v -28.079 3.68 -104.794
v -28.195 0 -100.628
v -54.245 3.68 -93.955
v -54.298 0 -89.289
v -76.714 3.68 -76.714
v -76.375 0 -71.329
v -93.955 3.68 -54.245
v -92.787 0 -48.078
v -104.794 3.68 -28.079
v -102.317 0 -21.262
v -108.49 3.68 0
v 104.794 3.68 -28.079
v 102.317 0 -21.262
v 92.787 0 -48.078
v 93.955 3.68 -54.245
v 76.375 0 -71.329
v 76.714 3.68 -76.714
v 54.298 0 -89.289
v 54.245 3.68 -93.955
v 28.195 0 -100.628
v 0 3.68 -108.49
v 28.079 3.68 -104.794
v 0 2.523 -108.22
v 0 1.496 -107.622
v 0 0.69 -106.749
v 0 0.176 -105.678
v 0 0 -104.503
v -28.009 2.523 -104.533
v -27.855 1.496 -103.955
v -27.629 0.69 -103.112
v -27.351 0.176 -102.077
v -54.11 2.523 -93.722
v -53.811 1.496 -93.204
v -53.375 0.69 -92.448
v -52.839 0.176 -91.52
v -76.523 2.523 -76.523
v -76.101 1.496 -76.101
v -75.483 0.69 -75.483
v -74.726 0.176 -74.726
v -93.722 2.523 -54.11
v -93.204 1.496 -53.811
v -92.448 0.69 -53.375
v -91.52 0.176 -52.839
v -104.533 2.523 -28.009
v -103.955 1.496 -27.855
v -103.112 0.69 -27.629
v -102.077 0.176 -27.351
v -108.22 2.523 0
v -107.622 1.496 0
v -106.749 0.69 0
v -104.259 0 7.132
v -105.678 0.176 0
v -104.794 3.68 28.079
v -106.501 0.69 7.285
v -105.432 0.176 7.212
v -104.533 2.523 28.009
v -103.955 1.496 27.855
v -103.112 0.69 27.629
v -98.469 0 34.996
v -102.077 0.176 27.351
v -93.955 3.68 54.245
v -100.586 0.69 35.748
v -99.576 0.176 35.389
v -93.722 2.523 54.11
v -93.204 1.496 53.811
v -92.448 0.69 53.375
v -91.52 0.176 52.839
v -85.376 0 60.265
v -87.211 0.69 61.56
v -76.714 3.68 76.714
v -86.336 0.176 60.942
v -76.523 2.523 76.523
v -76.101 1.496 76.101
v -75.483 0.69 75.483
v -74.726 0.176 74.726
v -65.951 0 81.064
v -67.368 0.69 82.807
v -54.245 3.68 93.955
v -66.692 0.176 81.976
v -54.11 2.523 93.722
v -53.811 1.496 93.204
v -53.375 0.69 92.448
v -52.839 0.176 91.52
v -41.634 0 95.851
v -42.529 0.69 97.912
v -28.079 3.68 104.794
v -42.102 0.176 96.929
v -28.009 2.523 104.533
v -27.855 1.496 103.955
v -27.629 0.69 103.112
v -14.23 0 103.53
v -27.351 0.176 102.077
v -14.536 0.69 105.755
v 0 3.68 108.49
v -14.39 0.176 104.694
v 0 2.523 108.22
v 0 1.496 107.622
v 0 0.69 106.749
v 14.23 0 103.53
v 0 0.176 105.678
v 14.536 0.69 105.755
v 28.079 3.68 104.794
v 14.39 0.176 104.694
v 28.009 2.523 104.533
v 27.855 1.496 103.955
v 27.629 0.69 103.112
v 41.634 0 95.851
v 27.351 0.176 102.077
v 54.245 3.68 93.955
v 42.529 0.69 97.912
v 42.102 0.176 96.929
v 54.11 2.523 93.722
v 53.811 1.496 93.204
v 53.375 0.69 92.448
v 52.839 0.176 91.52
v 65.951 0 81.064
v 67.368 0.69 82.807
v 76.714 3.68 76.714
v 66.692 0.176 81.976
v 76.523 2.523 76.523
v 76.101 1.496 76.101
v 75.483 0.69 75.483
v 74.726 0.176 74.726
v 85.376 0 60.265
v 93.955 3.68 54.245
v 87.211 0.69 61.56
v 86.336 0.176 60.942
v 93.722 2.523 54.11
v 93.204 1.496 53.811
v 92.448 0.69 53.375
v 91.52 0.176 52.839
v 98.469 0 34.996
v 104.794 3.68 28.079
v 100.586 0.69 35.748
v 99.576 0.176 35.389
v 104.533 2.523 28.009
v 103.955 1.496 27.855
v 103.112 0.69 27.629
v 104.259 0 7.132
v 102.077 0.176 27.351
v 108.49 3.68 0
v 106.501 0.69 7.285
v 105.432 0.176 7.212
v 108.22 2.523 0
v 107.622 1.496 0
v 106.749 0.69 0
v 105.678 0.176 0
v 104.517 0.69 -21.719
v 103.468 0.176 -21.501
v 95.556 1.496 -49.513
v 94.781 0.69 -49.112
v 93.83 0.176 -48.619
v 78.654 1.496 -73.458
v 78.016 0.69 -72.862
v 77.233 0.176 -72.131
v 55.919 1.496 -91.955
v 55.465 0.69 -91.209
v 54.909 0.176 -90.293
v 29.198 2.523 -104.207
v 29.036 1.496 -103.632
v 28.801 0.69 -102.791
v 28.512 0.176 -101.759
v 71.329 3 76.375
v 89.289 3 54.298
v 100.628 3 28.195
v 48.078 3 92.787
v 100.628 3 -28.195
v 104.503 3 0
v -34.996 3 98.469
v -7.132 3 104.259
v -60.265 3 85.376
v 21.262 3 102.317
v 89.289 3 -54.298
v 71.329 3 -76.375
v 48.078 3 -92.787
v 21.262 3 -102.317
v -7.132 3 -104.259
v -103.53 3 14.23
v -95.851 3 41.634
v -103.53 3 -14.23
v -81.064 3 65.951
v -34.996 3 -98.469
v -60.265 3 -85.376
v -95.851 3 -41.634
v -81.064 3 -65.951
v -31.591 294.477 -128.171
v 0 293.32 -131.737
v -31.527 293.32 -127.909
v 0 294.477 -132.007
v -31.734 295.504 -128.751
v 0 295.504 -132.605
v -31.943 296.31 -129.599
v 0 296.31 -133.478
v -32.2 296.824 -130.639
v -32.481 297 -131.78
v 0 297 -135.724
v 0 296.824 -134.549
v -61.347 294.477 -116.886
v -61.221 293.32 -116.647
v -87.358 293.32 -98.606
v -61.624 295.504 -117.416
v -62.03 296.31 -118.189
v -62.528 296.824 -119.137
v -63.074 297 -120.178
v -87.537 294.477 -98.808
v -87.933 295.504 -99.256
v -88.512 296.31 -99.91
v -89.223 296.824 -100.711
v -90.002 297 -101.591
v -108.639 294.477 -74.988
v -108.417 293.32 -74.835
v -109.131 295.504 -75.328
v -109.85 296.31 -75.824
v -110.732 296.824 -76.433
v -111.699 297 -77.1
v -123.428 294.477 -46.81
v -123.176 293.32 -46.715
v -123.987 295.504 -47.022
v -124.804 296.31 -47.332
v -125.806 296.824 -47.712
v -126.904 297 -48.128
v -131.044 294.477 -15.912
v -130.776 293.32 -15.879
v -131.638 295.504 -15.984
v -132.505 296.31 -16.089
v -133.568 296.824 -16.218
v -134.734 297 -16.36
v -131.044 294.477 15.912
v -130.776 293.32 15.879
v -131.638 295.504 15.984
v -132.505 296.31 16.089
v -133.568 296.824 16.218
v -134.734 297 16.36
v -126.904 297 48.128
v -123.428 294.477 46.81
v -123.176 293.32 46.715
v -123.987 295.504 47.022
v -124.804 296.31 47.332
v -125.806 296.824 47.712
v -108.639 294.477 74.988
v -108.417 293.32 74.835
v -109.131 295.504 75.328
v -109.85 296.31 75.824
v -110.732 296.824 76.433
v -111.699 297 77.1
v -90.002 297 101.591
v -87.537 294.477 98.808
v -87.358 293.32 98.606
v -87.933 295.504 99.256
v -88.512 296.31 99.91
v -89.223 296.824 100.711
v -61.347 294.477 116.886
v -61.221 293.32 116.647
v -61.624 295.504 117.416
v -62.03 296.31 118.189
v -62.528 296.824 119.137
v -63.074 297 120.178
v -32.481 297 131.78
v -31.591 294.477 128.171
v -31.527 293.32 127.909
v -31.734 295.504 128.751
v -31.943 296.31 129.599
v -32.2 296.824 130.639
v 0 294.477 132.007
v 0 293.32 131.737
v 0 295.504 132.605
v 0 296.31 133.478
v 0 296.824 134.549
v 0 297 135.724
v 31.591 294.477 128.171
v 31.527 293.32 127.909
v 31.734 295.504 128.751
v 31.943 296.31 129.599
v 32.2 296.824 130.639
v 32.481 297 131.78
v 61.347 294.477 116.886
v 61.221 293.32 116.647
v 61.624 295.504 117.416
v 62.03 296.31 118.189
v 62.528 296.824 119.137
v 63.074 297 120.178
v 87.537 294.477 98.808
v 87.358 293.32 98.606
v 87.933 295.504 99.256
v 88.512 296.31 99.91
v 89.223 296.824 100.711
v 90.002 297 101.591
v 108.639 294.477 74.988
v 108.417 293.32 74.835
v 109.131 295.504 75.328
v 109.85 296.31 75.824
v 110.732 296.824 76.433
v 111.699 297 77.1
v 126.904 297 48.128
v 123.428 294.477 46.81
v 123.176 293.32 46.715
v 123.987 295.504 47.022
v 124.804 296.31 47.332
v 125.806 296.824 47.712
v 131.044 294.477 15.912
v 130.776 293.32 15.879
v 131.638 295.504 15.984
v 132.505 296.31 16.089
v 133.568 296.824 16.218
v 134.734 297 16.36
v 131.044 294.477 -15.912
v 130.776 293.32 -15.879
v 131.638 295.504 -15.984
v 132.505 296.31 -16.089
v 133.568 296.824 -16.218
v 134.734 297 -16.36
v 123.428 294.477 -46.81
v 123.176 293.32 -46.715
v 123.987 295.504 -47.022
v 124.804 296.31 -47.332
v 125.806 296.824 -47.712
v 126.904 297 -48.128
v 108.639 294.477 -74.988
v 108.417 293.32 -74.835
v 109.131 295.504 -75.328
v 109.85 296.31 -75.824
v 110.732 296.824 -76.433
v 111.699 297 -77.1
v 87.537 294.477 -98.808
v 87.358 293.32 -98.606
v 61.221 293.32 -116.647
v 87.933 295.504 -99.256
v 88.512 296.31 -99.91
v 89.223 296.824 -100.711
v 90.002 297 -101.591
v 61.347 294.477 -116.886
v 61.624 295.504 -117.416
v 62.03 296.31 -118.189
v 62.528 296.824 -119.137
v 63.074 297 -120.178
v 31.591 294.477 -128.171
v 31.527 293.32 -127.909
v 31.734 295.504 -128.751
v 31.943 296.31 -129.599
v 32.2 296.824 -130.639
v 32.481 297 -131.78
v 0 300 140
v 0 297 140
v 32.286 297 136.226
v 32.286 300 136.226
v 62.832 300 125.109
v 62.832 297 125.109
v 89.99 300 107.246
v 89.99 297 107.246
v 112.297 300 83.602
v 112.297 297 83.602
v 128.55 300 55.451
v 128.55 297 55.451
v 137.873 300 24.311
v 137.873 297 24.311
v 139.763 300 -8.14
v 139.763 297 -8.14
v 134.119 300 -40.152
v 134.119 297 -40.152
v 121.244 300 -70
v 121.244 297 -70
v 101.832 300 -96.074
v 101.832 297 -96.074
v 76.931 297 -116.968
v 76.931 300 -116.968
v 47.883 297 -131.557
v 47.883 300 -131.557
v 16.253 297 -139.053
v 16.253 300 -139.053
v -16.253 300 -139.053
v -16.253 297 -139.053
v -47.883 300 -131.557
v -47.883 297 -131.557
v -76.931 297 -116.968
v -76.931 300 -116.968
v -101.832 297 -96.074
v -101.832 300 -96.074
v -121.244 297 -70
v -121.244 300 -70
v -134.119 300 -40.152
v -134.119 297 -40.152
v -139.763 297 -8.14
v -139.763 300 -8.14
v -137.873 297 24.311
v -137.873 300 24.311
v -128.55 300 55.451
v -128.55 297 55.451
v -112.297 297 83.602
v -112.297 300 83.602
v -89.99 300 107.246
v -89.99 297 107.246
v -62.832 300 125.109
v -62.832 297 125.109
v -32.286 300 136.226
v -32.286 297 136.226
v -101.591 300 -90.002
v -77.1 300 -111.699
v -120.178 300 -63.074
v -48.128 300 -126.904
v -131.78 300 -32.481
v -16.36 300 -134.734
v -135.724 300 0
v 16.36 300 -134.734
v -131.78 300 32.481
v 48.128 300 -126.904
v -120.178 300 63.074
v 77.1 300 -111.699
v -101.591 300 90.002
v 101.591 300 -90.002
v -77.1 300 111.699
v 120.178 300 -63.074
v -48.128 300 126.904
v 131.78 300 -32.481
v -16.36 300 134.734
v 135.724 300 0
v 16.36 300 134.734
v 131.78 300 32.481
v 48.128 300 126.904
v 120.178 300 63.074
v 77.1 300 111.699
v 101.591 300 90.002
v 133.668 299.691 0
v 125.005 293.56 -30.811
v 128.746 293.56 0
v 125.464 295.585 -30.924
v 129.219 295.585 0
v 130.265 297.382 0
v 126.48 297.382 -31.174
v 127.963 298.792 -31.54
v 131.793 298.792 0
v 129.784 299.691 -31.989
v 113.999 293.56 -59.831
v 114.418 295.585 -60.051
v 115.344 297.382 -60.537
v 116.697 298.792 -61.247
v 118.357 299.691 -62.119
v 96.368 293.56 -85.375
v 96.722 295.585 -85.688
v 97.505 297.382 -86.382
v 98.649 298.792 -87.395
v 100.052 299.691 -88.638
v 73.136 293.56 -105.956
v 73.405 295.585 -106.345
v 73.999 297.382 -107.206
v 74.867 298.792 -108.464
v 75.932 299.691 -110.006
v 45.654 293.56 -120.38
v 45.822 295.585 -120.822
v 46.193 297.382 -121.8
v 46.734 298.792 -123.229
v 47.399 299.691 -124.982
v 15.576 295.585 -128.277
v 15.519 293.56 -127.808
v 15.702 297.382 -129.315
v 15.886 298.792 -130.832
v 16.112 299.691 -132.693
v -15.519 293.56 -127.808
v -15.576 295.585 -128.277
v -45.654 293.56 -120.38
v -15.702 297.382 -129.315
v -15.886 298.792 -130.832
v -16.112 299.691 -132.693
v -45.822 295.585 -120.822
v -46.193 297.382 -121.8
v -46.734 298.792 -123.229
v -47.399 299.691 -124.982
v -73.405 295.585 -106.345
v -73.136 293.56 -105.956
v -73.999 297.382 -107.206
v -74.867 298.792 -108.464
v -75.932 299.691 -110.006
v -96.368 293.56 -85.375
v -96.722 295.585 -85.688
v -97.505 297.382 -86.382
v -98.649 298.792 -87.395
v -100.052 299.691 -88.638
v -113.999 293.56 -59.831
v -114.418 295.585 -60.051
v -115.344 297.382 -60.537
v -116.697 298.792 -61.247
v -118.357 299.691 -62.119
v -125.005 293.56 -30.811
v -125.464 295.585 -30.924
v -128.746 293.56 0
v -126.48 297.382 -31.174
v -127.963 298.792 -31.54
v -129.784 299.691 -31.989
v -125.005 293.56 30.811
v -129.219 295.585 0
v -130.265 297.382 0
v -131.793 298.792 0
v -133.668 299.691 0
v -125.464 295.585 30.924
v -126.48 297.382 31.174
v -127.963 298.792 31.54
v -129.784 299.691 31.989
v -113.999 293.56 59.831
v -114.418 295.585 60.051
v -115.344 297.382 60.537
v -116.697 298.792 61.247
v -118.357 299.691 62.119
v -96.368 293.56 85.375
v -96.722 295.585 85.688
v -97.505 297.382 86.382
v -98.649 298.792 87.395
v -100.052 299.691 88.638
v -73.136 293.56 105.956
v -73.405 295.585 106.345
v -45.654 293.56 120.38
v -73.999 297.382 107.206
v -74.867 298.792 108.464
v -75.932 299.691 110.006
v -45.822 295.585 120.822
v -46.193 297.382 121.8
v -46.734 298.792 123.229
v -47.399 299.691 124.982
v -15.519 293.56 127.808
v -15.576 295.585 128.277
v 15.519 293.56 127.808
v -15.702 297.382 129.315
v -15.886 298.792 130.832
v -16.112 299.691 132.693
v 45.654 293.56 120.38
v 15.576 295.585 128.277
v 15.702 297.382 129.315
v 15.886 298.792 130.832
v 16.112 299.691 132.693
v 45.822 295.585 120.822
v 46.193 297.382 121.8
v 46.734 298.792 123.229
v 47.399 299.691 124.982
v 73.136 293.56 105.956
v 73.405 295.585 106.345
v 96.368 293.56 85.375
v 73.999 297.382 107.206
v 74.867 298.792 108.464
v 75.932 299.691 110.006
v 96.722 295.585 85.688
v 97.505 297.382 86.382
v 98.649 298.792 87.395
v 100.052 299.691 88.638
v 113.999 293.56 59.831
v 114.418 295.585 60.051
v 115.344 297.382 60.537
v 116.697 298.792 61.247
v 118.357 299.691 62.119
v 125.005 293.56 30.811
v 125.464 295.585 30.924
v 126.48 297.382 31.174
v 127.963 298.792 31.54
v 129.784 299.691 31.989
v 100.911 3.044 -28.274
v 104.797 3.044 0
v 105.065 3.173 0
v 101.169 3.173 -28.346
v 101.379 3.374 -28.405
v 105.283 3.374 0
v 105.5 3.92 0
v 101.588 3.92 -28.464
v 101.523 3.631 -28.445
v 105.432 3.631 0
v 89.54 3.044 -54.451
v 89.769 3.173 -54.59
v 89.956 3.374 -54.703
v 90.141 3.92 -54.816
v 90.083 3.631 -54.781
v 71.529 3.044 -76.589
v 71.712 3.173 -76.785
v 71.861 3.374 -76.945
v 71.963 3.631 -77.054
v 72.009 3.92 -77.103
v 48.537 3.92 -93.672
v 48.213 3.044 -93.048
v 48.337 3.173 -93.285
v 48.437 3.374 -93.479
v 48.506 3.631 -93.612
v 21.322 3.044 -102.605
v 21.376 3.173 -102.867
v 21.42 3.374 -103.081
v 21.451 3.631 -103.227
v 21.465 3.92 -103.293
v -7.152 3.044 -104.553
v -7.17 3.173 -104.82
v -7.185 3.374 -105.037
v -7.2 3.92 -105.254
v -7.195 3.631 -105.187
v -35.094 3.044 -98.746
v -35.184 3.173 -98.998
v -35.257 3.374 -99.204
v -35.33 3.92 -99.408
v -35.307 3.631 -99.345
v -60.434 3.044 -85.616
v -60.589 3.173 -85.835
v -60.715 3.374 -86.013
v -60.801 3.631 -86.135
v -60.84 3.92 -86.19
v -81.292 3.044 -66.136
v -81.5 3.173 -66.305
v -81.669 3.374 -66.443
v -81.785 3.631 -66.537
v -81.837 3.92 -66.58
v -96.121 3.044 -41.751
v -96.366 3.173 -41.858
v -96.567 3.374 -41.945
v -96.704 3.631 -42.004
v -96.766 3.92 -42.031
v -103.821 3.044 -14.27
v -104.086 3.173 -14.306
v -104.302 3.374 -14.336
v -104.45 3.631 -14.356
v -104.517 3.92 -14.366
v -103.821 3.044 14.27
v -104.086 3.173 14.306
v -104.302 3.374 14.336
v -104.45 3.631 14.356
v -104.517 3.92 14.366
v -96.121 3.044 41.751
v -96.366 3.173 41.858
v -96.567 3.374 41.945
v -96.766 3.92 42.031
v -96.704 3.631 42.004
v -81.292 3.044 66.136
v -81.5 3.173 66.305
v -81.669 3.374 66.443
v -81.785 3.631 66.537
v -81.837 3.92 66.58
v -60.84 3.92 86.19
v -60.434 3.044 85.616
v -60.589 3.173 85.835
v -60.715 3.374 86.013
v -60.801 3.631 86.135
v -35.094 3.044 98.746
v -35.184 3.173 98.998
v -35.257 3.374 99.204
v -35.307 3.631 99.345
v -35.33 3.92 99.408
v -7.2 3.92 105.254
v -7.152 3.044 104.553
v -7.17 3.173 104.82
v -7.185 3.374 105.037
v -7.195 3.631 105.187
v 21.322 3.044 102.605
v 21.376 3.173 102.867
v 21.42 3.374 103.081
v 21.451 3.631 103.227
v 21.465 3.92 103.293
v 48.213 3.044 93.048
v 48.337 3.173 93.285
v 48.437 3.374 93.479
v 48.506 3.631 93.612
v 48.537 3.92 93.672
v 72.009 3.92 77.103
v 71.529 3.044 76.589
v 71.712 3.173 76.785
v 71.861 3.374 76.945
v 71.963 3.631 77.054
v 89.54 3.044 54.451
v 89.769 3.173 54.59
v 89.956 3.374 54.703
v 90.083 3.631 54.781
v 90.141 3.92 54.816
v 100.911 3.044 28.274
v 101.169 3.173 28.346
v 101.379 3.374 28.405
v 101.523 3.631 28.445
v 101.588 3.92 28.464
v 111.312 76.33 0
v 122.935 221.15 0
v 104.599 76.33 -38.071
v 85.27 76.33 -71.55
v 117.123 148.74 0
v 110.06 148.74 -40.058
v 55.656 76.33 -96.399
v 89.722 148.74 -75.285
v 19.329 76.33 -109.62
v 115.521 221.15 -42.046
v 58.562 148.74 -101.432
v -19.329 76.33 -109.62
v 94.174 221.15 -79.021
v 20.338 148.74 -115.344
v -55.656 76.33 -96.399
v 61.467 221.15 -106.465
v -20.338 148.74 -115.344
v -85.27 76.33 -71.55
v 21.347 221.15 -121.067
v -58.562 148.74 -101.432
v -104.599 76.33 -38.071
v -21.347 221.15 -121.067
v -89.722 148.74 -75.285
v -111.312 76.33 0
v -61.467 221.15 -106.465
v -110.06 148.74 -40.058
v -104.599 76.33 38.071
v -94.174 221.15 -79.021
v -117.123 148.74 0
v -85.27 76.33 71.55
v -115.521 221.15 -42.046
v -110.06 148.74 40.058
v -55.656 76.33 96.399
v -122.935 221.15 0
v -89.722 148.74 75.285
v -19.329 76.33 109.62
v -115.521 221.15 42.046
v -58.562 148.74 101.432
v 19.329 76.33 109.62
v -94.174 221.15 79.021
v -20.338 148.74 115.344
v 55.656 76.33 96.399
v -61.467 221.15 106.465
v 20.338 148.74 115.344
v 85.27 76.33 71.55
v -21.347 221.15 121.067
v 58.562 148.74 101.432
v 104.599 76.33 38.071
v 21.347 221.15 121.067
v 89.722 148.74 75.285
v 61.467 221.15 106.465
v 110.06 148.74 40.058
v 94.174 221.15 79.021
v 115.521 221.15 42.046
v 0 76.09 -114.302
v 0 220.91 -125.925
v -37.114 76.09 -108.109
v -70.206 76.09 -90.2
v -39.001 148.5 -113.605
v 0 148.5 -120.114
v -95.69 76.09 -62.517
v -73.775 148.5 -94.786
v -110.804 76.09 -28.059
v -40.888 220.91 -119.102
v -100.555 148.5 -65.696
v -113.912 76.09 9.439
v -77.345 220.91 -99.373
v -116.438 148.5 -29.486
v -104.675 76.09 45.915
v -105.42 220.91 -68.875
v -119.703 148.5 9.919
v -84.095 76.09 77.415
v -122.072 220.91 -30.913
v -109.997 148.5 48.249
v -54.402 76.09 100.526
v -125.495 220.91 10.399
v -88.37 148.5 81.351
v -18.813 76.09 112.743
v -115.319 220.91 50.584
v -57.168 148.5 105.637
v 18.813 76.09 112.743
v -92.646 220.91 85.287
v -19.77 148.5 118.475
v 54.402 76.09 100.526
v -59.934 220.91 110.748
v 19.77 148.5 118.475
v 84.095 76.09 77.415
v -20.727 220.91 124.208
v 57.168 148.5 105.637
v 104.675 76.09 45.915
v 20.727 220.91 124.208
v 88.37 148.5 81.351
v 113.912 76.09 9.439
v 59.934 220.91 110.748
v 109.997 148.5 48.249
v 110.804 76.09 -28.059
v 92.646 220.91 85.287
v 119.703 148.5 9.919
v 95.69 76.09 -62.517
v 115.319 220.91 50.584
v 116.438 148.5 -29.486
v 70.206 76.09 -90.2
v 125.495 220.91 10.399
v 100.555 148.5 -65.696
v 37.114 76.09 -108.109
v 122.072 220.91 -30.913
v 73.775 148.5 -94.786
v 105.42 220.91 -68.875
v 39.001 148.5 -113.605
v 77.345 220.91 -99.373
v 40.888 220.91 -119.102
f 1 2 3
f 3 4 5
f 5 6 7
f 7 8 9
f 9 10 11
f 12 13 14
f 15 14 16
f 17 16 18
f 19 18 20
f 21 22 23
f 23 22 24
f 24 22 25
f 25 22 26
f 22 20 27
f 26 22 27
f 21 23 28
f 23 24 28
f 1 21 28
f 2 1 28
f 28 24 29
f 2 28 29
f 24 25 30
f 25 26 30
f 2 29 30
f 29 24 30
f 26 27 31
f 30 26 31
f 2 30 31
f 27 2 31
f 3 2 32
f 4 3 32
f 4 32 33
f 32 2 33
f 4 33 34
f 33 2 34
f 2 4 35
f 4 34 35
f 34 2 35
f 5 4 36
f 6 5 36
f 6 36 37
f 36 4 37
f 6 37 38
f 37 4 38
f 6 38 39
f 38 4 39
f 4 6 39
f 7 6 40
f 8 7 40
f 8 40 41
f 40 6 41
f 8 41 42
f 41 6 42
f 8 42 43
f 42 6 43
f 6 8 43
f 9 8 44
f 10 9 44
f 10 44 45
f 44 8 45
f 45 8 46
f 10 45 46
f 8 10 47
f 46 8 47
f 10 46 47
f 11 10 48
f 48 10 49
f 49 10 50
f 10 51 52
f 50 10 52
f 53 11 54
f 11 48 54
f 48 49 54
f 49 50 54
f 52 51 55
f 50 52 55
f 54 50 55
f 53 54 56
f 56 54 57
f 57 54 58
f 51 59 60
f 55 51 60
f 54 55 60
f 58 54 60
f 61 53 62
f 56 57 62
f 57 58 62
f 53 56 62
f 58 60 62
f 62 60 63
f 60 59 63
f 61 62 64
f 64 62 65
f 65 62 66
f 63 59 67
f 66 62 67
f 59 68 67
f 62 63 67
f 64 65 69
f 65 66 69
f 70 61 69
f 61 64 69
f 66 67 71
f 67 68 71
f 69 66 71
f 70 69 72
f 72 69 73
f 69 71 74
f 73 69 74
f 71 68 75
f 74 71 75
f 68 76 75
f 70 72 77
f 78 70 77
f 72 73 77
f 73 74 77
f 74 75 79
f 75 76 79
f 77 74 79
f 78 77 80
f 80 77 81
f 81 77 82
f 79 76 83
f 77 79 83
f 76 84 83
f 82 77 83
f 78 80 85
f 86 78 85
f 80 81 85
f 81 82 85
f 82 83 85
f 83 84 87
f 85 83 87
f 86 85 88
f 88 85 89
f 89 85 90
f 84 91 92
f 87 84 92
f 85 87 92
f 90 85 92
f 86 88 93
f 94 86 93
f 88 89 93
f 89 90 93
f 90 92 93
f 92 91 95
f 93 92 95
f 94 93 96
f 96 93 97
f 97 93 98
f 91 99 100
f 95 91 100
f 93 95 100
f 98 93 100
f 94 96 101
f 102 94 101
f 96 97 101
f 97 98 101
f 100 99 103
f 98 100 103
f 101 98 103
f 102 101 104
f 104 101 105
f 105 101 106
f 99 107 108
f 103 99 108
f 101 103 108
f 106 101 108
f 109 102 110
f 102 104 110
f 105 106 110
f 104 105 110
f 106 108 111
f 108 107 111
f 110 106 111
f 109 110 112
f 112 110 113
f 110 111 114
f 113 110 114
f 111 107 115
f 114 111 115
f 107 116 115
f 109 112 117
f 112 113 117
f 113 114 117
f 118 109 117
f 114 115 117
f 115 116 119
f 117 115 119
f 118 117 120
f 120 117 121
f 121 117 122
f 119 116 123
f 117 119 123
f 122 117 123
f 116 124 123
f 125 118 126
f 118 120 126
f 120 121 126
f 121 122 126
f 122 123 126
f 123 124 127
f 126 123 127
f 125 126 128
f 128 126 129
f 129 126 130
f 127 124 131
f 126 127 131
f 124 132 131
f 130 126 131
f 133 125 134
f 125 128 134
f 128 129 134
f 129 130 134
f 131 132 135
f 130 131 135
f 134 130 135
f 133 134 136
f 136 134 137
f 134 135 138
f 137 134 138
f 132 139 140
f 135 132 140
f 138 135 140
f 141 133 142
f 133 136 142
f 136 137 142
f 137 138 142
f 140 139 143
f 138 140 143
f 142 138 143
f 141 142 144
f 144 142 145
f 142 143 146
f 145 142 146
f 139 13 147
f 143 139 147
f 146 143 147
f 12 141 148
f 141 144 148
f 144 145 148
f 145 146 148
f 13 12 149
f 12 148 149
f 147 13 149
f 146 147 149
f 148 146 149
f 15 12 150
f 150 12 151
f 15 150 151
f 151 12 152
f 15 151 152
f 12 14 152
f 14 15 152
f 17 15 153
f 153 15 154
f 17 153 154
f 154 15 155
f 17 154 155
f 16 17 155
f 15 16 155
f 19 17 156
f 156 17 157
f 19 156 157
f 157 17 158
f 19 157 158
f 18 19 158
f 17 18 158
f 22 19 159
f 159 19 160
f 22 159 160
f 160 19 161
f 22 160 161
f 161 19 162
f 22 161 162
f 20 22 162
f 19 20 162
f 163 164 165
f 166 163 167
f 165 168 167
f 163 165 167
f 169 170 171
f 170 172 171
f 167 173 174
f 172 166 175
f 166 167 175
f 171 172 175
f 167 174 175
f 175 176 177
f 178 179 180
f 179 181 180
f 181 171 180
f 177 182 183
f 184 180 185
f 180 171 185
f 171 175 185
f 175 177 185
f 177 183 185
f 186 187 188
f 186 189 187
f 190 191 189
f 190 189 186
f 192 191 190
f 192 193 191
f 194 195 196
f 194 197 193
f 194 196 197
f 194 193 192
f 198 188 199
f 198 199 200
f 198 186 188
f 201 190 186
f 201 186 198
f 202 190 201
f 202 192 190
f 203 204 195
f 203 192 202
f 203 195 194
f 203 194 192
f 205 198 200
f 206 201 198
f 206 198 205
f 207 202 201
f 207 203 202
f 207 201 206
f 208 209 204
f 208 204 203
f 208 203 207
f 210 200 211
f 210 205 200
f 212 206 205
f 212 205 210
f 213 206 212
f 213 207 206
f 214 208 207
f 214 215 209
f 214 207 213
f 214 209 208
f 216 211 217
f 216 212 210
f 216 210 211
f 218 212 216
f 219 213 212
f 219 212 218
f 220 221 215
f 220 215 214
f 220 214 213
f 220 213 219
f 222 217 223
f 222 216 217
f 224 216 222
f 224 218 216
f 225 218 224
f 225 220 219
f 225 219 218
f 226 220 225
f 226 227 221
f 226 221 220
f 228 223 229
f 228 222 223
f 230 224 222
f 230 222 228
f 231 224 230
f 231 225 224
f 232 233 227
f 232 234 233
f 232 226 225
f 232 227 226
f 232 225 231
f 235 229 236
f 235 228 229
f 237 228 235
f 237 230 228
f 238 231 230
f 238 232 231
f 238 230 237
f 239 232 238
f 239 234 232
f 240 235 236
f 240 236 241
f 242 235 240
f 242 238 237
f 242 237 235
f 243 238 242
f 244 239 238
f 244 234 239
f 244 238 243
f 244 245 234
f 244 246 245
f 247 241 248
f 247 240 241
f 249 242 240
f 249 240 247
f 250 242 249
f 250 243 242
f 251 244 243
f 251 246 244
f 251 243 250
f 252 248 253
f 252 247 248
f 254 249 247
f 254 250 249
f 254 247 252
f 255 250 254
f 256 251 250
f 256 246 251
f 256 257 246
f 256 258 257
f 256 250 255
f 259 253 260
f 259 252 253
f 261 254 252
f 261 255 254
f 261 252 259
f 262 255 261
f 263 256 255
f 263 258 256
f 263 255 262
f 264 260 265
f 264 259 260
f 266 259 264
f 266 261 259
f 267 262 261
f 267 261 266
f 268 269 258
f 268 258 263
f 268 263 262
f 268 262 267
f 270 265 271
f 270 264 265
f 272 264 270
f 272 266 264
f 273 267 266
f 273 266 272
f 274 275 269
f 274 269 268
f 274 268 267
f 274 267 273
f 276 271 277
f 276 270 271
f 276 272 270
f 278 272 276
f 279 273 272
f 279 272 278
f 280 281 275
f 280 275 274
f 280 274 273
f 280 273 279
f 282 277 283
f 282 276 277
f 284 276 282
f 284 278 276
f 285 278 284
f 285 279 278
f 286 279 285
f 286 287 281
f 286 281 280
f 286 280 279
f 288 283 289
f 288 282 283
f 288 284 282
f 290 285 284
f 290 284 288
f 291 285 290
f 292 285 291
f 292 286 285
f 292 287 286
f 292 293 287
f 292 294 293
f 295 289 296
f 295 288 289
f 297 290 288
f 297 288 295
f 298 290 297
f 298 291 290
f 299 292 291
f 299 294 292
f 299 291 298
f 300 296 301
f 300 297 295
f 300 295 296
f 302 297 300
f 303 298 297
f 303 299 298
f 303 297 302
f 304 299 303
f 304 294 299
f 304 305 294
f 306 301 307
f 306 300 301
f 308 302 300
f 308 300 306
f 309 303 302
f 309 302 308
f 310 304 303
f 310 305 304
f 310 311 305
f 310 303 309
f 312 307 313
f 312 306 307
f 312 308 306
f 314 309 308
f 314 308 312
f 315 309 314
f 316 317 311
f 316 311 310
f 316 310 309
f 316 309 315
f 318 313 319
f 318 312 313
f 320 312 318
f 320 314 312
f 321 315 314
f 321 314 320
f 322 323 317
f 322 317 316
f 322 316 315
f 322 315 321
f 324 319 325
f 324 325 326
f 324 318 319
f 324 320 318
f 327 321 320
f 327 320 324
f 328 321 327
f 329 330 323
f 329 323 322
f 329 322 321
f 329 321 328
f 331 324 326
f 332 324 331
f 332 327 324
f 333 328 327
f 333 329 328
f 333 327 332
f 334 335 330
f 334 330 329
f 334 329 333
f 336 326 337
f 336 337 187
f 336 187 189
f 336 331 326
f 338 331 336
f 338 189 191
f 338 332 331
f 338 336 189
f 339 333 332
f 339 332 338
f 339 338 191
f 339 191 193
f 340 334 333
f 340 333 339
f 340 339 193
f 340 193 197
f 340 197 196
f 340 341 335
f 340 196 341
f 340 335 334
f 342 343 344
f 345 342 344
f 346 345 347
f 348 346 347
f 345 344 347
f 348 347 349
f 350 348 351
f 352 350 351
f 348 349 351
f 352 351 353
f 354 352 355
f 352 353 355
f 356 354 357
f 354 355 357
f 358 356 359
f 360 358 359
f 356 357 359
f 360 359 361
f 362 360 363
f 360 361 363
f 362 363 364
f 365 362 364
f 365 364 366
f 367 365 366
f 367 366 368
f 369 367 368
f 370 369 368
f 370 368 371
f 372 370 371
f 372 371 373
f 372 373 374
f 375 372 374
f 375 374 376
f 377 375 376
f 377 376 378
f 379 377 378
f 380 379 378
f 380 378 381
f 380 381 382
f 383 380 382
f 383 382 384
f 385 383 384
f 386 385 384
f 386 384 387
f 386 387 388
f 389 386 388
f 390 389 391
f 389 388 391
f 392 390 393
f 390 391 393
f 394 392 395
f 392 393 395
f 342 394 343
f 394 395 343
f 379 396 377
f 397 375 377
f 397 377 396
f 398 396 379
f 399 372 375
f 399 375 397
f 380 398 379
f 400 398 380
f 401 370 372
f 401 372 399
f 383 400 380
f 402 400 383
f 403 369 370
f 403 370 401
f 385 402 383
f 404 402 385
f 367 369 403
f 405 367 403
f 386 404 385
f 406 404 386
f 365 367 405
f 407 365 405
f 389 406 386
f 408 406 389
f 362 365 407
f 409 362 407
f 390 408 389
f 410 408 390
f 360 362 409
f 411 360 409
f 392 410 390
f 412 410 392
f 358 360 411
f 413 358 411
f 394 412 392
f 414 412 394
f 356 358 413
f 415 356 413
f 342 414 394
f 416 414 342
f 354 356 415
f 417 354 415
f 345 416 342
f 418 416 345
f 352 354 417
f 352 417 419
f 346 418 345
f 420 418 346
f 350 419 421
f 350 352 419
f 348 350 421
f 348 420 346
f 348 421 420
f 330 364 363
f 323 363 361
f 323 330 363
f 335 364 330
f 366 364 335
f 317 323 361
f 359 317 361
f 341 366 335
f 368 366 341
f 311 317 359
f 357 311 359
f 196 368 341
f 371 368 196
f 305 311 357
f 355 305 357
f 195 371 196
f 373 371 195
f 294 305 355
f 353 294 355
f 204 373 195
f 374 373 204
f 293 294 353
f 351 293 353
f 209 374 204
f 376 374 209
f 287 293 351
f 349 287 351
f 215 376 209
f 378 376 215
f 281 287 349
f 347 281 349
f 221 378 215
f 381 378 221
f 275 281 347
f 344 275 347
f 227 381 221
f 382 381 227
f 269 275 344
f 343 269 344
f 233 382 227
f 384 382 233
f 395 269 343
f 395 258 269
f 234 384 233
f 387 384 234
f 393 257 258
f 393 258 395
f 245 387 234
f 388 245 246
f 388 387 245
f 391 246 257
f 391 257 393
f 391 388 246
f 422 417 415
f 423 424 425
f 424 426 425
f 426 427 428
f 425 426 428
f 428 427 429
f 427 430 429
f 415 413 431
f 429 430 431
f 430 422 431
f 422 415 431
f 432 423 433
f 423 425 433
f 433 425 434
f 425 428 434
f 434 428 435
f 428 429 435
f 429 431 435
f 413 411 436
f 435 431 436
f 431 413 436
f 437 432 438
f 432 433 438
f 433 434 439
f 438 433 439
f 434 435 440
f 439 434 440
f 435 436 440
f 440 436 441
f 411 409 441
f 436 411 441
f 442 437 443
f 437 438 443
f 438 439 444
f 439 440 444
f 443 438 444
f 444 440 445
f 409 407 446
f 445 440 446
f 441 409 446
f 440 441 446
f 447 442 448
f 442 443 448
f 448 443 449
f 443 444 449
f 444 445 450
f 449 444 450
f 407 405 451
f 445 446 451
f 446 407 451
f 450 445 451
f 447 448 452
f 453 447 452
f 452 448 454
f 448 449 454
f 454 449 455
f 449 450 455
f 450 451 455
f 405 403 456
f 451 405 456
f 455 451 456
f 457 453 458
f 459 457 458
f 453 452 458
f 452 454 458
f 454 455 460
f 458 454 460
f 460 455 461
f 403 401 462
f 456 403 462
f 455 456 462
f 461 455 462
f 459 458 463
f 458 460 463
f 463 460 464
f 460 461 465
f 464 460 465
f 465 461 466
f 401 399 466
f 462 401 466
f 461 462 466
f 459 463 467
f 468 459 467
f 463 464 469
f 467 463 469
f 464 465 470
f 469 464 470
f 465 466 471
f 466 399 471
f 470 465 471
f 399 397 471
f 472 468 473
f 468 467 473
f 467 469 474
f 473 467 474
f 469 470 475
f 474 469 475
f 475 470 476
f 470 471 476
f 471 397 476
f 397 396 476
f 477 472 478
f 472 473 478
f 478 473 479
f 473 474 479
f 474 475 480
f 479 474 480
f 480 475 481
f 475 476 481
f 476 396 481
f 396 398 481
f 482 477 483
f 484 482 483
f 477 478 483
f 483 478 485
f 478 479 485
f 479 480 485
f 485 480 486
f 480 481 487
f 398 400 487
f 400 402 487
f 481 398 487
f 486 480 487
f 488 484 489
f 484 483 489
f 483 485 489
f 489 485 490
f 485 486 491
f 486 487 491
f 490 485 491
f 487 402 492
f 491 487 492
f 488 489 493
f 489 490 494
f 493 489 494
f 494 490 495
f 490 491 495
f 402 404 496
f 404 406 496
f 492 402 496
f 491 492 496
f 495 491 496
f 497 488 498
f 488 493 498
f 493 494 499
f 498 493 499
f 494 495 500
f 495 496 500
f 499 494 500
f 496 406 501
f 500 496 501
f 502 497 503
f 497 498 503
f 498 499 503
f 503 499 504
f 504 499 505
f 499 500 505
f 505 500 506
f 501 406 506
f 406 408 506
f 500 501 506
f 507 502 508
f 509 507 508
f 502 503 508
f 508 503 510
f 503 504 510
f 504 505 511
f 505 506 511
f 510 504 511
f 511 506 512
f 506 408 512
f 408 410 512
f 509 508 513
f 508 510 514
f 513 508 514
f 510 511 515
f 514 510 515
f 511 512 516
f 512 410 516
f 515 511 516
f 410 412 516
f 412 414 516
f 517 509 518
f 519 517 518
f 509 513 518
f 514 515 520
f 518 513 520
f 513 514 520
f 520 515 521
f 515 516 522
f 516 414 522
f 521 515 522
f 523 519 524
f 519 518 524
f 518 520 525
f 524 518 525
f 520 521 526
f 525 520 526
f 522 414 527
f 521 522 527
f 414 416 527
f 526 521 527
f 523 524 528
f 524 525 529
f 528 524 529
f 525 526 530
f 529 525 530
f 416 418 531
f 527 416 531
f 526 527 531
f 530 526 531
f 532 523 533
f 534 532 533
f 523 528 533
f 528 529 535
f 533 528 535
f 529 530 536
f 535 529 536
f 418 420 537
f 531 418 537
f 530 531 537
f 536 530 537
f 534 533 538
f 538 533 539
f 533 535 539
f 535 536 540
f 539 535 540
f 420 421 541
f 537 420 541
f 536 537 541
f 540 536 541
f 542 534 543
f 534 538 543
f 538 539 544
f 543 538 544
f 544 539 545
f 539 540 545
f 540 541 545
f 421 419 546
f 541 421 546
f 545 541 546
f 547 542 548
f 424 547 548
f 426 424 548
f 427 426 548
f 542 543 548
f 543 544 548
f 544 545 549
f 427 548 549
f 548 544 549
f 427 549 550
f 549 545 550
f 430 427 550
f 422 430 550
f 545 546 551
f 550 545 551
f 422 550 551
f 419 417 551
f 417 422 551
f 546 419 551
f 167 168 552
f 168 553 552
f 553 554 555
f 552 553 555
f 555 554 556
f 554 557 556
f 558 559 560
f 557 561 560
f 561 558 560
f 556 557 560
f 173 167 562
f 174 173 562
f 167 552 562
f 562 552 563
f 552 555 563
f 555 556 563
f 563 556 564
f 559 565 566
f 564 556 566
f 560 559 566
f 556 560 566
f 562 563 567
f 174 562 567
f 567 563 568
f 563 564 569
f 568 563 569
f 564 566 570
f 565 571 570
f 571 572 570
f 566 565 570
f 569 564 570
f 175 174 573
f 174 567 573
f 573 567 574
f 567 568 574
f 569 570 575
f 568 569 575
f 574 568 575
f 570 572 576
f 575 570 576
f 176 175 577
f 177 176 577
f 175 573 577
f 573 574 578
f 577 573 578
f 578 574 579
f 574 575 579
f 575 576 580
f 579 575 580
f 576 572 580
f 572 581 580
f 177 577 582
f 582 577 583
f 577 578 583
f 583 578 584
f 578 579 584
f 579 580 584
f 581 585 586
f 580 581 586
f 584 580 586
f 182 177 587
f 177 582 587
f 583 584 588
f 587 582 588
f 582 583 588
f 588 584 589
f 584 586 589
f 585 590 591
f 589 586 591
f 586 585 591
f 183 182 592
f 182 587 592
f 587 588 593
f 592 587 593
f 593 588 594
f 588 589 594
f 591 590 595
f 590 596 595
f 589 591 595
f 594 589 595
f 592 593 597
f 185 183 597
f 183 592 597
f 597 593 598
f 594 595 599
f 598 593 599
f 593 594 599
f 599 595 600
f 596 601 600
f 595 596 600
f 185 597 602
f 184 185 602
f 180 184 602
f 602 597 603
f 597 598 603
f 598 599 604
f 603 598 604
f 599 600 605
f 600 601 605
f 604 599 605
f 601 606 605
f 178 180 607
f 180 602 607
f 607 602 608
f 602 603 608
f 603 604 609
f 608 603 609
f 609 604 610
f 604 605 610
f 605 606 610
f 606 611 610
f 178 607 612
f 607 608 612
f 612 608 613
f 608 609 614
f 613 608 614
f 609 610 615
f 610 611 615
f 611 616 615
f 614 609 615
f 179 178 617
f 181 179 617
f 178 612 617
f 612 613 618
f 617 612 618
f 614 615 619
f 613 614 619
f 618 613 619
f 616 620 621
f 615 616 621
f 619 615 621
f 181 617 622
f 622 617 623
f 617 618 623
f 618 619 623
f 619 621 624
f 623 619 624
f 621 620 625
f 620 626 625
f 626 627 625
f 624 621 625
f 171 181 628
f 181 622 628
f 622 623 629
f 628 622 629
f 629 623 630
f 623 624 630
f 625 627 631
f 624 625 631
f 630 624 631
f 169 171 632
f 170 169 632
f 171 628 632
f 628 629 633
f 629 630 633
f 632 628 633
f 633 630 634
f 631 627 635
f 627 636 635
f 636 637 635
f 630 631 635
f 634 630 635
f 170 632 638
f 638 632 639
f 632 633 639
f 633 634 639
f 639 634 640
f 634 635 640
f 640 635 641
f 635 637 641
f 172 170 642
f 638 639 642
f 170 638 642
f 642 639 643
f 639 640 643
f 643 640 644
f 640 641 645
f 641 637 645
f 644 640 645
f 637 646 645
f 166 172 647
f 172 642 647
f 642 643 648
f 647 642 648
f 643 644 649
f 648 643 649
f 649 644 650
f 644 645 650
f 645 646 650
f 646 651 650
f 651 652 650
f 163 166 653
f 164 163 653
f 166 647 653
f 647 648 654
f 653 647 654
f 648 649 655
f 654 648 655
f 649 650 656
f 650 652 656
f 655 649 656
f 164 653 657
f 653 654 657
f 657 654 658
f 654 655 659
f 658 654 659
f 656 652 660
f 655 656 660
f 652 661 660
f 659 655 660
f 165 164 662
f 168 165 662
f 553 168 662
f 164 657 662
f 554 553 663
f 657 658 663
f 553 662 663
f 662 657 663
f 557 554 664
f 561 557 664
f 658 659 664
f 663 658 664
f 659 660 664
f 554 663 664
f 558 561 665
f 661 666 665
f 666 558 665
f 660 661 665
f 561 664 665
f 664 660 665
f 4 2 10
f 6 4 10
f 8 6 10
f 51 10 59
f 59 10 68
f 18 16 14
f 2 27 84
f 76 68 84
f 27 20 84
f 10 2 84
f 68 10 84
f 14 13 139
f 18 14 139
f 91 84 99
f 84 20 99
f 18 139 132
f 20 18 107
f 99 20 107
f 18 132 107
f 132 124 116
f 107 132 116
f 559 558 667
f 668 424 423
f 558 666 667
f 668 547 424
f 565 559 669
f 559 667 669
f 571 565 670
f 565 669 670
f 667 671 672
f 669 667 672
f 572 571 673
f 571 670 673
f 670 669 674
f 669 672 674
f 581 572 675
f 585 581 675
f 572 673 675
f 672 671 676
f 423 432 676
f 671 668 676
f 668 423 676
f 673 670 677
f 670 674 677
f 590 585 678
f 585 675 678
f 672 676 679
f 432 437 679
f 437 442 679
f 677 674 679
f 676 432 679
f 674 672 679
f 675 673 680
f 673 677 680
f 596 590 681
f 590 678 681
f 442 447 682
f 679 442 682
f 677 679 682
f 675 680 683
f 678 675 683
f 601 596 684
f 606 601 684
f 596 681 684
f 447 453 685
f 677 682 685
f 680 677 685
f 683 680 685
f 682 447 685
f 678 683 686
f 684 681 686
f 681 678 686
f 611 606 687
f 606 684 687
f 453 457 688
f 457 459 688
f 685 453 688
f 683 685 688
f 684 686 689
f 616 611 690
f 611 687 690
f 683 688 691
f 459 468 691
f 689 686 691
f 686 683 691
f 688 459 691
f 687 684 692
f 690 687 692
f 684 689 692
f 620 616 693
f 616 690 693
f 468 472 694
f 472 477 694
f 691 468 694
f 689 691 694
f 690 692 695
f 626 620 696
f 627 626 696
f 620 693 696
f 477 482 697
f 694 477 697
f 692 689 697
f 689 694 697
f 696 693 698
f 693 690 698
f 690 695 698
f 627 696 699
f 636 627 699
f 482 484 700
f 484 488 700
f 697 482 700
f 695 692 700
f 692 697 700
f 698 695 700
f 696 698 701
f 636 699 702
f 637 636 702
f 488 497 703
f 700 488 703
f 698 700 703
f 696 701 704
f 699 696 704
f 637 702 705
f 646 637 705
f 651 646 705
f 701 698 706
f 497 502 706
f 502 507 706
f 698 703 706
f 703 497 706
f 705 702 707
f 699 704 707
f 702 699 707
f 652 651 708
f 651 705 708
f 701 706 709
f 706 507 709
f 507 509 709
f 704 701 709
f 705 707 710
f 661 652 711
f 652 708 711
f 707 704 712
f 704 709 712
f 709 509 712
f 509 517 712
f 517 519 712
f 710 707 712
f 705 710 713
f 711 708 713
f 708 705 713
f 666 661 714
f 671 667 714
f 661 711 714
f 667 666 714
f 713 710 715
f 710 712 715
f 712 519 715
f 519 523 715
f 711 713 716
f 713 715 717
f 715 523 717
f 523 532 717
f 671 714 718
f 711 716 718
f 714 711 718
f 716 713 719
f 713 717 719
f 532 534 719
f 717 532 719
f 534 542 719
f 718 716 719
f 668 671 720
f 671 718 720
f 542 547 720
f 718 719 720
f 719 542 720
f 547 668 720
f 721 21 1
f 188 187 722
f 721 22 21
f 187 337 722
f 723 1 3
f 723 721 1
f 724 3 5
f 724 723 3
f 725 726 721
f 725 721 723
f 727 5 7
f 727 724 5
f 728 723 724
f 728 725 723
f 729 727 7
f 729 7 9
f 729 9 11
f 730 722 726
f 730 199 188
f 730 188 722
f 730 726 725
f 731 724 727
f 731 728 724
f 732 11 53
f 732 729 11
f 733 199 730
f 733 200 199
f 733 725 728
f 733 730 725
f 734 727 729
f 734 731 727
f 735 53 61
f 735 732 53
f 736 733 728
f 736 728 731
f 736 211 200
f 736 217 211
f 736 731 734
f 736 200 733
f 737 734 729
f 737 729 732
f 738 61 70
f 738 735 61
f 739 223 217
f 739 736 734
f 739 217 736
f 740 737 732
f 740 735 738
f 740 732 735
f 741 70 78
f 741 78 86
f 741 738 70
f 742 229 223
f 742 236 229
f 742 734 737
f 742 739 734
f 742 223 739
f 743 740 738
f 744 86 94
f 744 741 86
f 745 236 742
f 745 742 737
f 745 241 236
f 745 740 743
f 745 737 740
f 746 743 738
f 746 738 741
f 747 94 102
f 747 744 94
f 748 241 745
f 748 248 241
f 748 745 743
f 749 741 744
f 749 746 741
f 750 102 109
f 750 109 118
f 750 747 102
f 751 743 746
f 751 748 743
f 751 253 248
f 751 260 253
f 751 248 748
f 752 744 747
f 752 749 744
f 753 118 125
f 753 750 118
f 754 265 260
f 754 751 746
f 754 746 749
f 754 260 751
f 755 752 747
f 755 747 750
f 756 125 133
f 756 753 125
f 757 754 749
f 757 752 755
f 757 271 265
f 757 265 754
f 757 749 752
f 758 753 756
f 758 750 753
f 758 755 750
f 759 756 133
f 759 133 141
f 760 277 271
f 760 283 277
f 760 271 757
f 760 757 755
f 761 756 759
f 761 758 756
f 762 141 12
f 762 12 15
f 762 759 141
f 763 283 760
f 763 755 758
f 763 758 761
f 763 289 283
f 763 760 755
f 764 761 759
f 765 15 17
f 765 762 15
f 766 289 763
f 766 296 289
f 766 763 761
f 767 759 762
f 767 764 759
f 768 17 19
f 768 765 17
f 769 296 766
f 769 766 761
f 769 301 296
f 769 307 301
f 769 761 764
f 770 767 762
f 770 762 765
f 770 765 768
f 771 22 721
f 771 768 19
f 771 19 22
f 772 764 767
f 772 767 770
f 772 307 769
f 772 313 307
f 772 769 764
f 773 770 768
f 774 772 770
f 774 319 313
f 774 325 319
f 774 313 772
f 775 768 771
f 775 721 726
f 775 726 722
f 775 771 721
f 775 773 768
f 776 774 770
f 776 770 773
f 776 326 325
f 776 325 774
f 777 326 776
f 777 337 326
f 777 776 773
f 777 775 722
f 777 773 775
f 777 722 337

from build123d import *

# Parameters (mm, degrees)
SKETCH1_R           = 140
BOSS_EXTRUDE1_DEPTH = 300
FILLET1_R           = 4


# Read off the part's stored shape, not the designer's step: Shell1
with BuildPart() as part:
    # Sketch1 → Boss-Extrude1 (new body)
    with BuildSketch(Plane(origin=(0, 0, 0), x_dir=(1, 0, 0), z_dir=(0, 1, 0))):
        with Locations(Location((0, 0, 0), (0, 0, 270))):
            Circle(SKETCH1_R)
    extrude(amount=BOSS_EXTRUDE1_DEPTH)

    # Sketch3 → Cut-Revolve1 (revolve, cut)
    with BuildSketch(Plane.XY, mode=Mode.PRIVATE) as cut_revolve1_sk:
        with BuildLine():
            Line((-107.848101266, -4.321058688), (-131.736864002, 293.320012156))
            ThreePointArc((-131.736864002, 293.320012156), (-133.011114968, 295.939391827), (-135.72404248, 297))
            Line((-135.72404248, 297), (-179.746835443, 297))
            Line((-179.746835443, 297), (-193.472957422, -4.321058688))
            Line((-193.472957422, -4.321058688), (-107.848101266, -4.321058688))
        make_face()
    revolve(cut_revolve1_sk.sketch.rotate(Axis((0, -4.321058688, 0), (0, 1, 0)), 270), axis=Axis((0, -4.321058688, 0), (0, 1, 0)), mode=Mode.SUBTRACT)

    # Fillet1
    fillet1_edges = [part.edges().sort_by_distance(p)[0] for p in [
        (0, 0, 108.194910748),
    ]]
    fillet(fillet1_edges, radius=FILLET1_R)

    # Shell1 outline → Shell1 (revolve, cut)
    with BuildSketch(Plane.XY):
        with BuildLine():
            ThreePointArc((104.503089212, 3), (105.18132109, 3.265152043), (105.499883831, 3.919996961))
            Line((105.499883831, 3.919996961), (128.746480143, 293.560021272))
            ThreePointArc((128.746480143, 293.560021272), (130.976419333, 298.143935697), (135.72404248, 300))
            Line((135.72404248, 300), (0, 300))
            Line((0, 300), (0, 3))
            Line((0, 3), (104.503089212, 3))
        make_face()
    revolve(axis=Axis((0, 0, 0), (0, 1, 0)), mode=Mode.SUBTRACT)


solid = part.part
